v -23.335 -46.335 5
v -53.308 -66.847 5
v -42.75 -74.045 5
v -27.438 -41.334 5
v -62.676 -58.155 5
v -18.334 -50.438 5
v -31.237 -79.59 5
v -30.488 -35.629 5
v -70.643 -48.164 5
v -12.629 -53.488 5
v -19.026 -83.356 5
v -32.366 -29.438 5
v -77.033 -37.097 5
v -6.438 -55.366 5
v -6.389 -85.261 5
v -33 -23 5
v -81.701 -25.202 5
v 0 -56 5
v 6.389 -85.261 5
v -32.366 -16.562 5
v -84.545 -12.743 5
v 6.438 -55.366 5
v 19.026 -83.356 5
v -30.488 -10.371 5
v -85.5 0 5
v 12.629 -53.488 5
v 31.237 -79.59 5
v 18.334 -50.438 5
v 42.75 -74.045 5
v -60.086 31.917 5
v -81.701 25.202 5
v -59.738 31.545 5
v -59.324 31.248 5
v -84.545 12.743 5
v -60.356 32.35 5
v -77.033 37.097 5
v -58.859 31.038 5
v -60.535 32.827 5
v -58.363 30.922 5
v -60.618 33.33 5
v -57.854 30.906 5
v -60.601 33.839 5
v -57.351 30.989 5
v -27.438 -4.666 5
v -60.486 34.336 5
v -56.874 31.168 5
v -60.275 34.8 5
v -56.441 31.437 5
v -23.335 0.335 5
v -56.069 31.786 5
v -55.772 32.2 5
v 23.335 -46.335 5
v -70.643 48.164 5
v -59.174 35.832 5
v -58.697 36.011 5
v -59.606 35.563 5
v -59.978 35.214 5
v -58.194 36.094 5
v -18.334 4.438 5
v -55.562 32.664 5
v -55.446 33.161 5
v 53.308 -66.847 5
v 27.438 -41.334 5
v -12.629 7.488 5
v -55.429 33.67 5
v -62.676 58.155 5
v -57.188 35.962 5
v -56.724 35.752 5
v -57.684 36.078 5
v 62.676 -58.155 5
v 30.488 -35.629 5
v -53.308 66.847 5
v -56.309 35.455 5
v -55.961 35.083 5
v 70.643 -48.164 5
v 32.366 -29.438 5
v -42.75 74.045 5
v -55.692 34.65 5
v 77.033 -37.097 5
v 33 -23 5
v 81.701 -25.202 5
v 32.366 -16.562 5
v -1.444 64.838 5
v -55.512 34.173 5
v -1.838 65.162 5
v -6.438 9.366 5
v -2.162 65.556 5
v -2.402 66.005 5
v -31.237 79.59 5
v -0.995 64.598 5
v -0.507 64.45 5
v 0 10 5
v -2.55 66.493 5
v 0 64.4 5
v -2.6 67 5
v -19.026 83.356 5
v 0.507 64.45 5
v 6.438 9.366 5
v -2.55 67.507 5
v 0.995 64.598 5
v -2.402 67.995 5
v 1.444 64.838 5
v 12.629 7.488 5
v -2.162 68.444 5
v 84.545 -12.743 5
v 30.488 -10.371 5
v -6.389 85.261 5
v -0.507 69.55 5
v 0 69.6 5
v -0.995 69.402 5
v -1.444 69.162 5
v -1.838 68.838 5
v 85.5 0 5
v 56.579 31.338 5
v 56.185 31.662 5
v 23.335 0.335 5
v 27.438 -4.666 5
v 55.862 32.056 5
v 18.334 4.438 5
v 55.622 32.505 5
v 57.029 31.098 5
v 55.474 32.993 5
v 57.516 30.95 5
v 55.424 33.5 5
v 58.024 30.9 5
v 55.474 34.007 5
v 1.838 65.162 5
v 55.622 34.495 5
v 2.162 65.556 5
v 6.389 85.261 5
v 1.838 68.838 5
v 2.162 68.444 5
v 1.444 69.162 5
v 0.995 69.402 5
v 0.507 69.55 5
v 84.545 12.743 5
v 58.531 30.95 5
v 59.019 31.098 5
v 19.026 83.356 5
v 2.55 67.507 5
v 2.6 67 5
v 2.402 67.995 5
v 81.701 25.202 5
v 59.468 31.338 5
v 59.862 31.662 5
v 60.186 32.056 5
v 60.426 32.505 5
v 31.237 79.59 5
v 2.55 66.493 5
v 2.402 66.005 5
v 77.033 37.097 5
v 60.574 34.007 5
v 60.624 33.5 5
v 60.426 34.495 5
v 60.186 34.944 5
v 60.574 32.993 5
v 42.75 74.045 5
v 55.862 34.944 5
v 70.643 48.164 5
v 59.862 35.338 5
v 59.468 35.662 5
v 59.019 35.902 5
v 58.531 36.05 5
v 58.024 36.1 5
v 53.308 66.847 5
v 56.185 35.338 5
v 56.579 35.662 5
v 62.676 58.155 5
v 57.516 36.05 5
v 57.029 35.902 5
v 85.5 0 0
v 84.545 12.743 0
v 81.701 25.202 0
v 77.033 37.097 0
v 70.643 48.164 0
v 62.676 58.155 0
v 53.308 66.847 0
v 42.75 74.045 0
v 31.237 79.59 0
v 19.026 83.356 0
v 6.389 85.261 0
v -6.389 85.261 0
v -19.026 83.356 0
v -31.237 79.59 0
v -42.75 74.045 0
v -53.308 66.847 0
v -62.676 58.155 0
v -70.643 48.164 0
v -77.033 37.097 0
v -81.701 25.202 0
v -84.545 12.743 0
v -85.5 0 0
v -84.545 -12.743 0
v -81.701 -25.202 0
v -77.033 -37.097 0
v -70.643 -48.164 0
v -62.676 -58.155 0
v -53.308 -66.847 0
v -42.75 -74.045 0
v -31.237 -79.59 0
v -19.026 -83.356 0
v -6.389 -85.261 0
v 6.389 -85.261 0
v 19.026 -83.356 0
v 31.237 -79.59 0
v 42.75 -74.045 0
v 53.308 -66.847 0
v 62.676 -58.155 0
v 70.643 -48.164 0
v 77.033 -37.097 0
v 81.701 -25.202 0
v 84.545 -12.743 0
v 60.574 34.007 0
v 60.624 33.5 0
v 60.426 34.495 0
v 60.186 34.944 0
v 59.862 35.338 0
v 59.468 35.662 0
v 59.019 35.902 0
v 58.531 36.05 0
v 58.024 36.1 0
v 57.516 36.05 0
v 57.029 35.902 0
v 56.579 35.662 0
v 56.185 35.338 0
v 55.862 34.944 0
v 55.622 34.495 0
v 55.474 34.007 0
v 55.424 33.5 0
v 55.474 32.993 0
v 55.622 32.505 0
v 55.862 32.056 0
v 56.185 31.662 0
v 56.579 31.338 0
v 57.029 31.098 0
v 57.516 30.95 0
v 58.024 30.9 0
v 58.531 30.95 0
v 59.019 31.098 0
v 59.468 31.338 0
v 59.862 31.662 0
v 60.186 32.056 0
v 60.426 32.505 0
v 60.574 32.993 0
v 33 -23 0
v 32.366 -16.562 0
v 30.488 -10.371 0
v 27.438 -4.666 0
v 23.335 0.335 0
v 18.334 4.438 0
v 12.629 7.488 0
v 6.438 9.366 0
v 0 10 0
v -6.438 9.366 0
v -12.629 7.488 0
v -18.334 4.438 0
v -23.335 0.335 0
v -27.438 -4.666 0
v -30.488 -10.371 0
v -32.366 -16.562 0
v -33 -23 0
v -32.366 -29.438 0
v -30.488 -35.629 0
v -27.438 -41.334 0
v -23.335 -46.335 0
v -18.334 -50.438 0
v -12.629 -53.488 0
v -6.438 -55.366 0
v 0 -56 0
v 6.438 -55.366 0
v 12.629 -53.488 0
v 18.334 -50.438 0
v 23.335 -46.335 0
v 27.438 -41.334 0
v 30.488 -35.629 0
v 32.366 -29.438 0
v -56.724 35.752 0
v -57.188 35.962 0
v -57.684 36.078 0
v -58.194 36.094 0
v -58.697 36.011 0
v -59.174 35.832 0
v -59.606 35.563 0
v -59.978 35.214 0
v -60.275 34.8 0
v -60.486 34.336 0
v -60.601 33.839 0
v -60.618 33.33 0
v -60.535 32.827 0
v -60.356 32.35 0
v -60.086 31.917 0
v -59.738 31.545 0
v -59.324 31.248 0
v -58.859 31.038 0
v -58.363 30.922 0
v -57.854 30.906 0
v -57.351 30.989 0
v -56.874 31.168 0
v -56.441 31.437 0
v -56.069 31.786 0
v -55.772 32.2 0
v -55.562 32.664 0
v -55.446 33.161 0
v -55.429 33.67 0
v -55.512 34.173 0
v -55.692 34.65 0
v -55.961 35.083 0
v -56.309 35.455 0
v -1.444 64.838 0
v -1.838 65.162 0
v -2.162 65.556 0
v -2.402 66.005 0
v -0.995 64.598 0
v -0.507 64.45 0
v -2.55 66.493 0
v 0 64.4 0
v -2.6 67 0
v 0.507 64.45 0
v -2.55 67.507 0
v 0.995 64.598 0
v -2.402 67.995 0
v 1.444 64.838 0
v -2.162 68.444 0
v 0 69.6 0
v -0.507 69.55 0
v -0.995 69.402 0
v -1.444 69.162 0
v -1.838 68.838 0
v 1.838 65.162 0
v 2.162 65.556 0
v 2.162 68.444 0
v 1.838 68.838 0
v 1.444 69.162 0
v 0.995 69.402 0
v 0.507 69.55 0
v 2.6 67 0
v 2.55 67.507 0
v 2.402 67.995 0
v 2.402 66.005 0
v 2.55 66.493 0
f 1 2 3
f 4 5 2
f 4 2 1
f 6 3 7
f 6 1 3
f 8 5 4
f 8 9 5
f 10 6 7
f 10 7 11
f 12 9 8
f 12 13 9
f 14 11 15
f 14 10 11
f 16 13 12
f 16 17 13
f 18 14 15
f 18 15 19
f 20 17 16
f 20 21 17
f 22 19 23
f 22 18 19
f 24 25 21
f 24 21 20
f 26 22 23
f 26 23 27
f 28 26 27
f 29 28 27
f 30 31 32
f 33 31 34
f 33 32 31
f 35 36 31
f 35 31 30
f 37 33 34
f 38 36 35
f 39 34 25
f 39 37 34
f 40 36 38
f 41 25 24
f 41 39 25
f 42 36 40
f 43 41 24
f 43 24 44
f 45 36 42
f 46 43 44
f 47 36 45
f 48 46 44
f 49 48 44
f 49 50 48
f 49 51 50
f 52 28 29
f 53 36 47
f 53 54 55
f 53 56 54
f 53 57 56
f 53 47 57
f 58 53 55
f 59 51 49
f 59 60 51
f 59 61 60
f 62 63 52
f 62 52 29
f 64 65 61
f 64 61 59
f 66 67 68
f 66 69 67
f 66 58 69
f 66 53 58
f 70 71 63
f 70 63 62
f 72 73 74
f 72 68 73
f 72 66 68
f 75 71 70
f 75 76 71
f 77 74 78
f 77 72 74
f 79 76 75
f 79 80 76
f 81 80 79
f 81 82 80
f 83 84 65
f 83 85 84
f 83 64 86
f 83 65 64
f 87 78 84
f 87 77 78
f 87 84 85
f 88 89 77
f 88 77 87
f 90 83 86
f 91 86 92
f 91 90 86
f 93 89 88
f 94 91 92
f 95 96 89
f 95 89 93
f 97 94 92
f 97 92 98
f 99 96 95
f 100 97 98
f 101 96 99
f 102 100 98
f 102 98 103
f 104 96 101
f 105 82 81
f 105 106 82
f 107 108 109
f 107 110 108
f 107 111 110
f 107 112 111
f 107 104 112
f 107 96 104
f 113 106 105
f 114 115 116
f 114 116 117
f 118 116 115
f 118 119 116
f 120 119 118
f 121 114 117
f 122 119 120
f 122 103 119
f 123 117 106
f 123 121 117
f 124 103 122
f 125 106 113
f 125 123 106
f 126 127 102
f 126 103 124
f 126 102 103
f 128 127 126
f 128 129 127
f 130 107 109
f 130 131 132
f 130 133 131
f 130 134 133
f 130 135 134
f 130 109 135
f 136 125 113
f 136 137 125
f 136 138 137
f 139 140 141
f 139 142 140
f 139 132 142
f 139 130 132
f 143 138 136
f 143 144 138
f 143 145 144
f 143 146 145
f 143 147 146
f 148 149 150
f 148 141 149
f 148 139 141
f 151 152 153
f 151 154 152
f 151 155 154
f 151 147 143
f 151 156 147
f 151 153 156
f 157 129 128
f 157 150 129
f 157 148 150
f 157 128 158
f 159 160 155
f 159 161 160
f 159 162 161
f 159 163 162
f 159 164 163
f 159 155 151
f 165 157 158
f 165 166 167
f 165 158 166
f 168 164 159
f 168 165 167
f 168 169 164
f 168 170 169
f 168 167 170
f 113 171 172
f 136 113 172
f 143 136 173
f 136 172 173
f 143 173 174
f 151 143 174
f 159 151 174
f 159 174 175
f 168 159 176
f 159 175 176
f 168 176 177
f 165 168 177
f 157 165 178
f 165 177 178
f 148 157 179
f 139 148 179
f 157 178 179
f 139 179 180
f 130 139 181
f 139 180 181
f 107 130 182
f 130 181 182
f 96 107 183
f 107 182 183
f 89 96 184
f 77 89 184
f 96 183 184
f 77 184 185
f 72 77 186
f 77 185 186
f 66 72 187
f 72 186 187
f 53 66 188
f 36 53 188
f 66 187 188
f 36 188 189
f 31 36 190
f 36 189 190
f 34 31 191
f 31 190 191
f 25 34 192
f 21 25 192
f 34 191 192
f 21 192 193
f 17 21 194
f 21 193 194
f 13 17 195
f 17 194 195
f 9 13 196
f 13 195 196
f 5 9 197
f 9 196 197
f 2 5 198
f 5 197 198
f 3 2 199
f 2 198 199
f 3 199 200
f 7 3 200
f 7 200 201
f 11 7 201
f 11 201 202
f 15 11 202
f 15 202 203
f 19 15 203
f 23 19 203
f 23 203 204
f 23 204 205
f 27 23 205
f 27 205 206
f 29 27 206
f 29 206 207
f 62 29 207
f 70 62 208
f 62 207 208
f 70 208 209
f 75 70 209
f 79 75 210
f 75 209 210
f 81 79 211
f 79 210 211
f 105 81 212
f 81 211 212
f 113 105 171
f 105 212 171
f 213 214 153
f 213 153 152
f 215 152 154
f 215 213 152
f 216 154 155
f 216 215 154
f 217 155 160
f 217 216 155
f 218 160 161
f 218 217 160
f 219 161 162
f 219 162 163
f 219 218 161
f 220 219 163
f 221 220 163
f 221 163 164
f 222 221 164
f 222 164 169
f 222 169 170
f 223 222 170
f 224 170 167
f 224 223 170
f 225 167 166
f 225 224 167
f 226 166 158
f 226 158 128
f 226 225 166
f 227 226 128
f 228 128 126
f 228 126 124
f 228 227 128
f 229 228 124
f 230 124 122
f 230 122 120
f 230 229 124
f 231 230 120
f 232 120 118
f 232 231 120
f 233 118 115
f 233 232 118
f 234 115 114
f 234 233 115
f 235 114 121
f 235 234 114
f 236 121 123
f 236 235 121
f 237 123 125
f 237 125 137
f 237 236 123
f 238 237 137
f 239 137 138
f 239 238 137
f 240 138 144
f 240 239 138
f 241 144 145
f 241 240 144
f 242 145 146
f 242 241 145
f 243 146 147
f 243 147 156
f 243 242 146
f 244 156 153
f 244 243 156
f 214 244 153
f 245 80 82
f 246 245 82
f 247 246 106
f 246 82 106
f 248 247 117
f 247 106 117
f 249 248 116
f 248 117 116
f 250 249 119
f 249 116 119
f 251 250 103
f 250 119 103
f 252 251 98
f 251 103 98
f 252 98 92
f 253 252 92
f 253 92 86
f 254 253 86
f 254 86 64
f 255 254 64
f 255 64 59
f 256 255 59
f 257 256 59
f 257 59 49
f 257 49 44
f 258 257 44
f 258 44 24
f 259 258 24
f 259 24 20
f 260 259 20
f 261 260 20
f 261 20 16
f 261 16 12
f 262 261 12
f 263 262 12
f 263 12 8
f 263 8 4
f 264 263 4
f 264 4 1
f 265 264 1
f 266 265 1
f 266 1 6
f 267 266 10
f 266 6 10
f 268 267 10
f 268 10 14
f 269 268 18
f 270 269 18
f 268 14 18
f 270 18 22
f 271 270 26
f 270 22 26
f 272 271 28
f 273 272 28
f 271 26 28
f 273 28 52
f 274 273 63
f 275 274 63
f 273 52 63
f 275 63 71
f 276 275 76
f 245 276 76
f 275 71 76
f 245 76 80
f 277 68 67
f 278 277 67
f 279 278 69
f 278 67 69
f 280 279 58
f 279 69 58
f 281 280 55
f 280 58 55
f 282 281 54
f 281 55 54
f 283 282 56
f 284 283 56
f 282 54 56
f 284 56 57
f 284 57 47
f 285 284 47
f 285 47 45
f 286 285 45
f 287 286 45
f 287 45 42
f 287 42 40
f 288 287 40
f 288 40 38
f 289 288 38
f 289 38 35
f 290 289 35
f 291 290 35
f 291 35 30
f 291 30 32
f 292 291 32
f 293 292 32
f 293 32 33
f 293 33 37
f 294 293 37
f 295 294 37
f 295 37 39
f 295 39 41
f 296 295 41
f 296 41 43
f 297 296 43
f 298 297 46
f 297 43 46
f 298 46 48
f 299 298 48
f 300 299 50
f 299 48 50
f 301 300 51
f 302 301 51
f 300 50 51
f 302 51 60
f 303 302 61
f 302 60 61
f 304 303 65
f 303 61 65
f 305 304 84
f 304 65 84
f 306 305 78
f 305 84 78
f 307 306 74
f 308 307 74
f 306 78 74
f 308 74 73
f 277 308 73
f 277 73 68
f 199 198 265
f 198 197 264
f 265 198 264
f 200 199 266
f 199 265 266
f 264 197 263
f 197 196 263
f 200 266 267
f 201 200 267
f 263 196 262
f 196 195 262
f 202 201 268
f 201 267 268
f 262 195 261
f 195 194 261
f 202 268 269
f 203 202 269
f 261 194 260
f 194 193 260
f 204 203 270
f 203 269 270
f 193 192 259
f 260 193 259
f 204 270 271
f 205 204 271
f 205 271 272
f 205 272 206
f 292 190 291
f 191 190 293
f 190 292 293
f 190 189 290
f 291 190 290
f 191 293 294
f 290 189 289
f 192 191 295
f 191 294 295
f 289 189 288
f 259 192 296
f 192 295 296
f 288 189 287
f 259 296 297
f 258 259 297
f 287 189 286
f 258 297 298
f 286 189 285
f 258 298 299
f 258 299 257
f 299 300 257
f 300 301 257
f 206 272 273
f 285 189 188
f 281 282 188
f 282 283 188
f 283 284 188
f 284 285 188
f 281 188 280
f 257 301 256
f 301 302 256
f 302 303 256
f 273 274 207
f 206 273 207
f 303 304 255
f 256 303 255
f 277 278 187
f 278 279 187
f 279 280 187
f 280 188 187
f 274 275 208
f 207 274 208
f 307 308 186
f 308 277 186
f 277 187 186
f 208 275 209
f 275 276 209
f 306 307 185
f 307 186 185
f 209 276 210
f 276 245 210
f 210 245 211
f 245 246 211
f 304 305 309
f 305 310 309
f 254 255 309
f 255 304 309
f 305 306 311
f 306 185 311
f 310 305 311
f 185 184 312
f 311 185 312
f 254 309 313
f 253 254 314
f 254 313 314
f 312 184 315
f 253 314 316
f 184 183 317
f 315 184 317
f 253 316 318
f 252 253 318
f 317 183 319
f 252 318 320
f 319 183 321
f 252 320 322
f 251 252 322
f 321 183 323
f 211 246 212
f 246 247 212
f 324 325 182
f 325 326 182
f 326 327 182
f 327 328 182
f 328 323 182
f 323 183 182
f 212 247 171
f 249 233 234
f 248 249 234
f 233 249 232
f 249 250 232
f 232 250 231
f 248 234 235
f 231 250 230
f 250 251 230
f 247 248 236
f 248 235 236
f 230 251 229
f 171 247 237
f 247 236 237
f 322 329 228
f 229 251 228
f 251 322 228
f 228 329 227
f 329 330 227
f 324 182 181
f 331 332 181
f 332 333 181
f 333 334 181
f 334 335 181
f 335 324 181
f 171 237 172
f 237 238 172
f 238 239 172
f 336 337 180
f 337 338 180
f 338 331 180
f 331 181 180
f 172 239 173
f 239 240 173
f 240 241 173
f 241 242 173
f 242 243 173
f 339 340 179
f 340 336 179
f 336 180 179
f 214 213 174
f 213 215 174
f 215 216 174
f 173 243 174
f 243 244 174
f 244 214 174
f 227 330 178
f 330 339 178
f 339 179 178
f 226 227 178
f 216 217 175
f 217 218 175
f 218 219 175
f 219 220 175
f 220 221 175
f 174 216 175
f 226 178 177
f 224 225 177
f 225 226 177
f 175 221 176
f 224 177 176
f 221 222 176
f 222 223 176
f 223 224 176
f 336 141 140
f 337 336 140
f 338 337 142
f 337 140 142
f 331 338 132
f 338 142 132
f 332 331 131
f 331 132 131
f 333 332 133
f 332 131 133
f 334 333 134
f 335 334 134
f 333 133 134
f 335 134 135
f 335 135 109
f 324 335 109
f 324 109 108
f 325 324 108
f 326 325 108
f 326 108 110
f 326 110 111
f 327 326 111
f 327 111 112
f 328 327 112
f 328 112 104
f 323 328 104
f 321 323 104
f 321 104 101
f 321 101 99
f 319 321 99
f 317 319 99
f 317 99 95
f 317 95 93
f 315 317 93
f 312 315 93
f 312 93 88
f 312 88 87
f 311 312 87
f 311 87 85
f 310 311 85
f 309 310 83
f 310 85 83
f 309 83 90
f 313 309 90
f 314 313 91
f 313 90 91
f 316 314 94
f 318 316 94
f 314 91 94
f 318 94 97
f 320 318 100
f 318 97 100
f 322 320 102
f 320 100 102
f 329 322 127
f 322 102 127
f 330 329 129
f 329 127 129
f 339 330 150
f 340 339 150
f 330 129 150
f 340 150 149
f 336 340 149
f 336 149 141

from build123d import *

# Parameters (mm, degrees)
SKETCH2_R                   = 85.5
BOSS_EXTRUDE1_DEPTH         = 5
SKETCH3_R                   = 33
CUT_EXTRUDE1_DEPTH          = 122.018593613
SKETCH4_R                   = 2.6
CUT_EXTRUDE2_DEPTH          = 122.018593613
CIRPATTERN3_COUNT           = 2
CIRPATTERN3_ANGLE           = 60
CIRPATTERN4_COPY_1_SKETCH_R = 2.6
CIRPATTERN4_COPY_1_DEPTH    = 122.018593613
CIRPATTERN4_COPY_2_SKETCH_R = 2.6
CIRPATTERN4_COPY_2_DEPTH    = 122.018593613


with BuildPart() as part:
    # Sketch2 → Boss-Extrude1 (new body)
    with BuildSketch(Plane.XY):
        Circle(SKETCH2_R)
    extrude(amount=BOSS_EXTRUDE1_DEPTH)

    # Sketch3 → Cut-Extrude1 (cut, through all)
    with BuildSketch(Plane.XY.offset(5)):
        with Locations((0, -23)):
            Circle(SKETCH3_R)
    extrude(amount=-CUT_EXTRUDE1_DEPTH, mode=Mode.SUBTRACT)

    # Sketch4 → Cut-Extrude2 (cut, through all)
    with BuildSketch(Plane.XY.offset(5)):
        with Locations((0, 67)):
            Circle(SKETCH4_R)
    cut_extrude2 = extrude(amount=-CUT_EXTRUDE2_DEPTH, mode=Mode.SUBTRACT)

    # CirPattern3: Cut-Extrude2 ×2 about axis
    cirpattern3_axis = Axis((0, 0, 5), (0, 0, 1))
    for i in range(1, CIRPATTERN3_COUNT):
        add(cut_extrude2.rotate(cirpattern3_axis, i * CIRPATTERN3_ANGLE / (CIRPATTERN3_COUNT - 1)), mode=Mode.SUBTRACT)

    # CirPattern4 copy 1 sketch → CirPattern4 copy 1 (cut, through all)
    with BuildSketch(Plane.XY.offset(5)):
        with Locations((0, 67)):
            Circle(CIRPATTERN4_COPY_1_SKETCH_R)
    extrude(amount=-CIRPATTERN4_COPY_1_DEPTH, mode=Mode.SUBTRACT)

    # CirPattern4 copy 2 sketch → CirPattern4 copy 2 (cut, through all)
    with BuildSketch(Plane(origin=(0, 0, 5), x_dir=(0.4999999999999978, -0.8660254037844399, 0), z_dir=(0, 0, 1))):
        with Locations((0, 67)):
            Circle(CIRPATTERN4_COPY_2_SKETCH_R)
    extrude(amount=-CIRPATTERN4_COPY_2_DEPTH, mode=Mode.SUBTRACT)


solid = part.part
